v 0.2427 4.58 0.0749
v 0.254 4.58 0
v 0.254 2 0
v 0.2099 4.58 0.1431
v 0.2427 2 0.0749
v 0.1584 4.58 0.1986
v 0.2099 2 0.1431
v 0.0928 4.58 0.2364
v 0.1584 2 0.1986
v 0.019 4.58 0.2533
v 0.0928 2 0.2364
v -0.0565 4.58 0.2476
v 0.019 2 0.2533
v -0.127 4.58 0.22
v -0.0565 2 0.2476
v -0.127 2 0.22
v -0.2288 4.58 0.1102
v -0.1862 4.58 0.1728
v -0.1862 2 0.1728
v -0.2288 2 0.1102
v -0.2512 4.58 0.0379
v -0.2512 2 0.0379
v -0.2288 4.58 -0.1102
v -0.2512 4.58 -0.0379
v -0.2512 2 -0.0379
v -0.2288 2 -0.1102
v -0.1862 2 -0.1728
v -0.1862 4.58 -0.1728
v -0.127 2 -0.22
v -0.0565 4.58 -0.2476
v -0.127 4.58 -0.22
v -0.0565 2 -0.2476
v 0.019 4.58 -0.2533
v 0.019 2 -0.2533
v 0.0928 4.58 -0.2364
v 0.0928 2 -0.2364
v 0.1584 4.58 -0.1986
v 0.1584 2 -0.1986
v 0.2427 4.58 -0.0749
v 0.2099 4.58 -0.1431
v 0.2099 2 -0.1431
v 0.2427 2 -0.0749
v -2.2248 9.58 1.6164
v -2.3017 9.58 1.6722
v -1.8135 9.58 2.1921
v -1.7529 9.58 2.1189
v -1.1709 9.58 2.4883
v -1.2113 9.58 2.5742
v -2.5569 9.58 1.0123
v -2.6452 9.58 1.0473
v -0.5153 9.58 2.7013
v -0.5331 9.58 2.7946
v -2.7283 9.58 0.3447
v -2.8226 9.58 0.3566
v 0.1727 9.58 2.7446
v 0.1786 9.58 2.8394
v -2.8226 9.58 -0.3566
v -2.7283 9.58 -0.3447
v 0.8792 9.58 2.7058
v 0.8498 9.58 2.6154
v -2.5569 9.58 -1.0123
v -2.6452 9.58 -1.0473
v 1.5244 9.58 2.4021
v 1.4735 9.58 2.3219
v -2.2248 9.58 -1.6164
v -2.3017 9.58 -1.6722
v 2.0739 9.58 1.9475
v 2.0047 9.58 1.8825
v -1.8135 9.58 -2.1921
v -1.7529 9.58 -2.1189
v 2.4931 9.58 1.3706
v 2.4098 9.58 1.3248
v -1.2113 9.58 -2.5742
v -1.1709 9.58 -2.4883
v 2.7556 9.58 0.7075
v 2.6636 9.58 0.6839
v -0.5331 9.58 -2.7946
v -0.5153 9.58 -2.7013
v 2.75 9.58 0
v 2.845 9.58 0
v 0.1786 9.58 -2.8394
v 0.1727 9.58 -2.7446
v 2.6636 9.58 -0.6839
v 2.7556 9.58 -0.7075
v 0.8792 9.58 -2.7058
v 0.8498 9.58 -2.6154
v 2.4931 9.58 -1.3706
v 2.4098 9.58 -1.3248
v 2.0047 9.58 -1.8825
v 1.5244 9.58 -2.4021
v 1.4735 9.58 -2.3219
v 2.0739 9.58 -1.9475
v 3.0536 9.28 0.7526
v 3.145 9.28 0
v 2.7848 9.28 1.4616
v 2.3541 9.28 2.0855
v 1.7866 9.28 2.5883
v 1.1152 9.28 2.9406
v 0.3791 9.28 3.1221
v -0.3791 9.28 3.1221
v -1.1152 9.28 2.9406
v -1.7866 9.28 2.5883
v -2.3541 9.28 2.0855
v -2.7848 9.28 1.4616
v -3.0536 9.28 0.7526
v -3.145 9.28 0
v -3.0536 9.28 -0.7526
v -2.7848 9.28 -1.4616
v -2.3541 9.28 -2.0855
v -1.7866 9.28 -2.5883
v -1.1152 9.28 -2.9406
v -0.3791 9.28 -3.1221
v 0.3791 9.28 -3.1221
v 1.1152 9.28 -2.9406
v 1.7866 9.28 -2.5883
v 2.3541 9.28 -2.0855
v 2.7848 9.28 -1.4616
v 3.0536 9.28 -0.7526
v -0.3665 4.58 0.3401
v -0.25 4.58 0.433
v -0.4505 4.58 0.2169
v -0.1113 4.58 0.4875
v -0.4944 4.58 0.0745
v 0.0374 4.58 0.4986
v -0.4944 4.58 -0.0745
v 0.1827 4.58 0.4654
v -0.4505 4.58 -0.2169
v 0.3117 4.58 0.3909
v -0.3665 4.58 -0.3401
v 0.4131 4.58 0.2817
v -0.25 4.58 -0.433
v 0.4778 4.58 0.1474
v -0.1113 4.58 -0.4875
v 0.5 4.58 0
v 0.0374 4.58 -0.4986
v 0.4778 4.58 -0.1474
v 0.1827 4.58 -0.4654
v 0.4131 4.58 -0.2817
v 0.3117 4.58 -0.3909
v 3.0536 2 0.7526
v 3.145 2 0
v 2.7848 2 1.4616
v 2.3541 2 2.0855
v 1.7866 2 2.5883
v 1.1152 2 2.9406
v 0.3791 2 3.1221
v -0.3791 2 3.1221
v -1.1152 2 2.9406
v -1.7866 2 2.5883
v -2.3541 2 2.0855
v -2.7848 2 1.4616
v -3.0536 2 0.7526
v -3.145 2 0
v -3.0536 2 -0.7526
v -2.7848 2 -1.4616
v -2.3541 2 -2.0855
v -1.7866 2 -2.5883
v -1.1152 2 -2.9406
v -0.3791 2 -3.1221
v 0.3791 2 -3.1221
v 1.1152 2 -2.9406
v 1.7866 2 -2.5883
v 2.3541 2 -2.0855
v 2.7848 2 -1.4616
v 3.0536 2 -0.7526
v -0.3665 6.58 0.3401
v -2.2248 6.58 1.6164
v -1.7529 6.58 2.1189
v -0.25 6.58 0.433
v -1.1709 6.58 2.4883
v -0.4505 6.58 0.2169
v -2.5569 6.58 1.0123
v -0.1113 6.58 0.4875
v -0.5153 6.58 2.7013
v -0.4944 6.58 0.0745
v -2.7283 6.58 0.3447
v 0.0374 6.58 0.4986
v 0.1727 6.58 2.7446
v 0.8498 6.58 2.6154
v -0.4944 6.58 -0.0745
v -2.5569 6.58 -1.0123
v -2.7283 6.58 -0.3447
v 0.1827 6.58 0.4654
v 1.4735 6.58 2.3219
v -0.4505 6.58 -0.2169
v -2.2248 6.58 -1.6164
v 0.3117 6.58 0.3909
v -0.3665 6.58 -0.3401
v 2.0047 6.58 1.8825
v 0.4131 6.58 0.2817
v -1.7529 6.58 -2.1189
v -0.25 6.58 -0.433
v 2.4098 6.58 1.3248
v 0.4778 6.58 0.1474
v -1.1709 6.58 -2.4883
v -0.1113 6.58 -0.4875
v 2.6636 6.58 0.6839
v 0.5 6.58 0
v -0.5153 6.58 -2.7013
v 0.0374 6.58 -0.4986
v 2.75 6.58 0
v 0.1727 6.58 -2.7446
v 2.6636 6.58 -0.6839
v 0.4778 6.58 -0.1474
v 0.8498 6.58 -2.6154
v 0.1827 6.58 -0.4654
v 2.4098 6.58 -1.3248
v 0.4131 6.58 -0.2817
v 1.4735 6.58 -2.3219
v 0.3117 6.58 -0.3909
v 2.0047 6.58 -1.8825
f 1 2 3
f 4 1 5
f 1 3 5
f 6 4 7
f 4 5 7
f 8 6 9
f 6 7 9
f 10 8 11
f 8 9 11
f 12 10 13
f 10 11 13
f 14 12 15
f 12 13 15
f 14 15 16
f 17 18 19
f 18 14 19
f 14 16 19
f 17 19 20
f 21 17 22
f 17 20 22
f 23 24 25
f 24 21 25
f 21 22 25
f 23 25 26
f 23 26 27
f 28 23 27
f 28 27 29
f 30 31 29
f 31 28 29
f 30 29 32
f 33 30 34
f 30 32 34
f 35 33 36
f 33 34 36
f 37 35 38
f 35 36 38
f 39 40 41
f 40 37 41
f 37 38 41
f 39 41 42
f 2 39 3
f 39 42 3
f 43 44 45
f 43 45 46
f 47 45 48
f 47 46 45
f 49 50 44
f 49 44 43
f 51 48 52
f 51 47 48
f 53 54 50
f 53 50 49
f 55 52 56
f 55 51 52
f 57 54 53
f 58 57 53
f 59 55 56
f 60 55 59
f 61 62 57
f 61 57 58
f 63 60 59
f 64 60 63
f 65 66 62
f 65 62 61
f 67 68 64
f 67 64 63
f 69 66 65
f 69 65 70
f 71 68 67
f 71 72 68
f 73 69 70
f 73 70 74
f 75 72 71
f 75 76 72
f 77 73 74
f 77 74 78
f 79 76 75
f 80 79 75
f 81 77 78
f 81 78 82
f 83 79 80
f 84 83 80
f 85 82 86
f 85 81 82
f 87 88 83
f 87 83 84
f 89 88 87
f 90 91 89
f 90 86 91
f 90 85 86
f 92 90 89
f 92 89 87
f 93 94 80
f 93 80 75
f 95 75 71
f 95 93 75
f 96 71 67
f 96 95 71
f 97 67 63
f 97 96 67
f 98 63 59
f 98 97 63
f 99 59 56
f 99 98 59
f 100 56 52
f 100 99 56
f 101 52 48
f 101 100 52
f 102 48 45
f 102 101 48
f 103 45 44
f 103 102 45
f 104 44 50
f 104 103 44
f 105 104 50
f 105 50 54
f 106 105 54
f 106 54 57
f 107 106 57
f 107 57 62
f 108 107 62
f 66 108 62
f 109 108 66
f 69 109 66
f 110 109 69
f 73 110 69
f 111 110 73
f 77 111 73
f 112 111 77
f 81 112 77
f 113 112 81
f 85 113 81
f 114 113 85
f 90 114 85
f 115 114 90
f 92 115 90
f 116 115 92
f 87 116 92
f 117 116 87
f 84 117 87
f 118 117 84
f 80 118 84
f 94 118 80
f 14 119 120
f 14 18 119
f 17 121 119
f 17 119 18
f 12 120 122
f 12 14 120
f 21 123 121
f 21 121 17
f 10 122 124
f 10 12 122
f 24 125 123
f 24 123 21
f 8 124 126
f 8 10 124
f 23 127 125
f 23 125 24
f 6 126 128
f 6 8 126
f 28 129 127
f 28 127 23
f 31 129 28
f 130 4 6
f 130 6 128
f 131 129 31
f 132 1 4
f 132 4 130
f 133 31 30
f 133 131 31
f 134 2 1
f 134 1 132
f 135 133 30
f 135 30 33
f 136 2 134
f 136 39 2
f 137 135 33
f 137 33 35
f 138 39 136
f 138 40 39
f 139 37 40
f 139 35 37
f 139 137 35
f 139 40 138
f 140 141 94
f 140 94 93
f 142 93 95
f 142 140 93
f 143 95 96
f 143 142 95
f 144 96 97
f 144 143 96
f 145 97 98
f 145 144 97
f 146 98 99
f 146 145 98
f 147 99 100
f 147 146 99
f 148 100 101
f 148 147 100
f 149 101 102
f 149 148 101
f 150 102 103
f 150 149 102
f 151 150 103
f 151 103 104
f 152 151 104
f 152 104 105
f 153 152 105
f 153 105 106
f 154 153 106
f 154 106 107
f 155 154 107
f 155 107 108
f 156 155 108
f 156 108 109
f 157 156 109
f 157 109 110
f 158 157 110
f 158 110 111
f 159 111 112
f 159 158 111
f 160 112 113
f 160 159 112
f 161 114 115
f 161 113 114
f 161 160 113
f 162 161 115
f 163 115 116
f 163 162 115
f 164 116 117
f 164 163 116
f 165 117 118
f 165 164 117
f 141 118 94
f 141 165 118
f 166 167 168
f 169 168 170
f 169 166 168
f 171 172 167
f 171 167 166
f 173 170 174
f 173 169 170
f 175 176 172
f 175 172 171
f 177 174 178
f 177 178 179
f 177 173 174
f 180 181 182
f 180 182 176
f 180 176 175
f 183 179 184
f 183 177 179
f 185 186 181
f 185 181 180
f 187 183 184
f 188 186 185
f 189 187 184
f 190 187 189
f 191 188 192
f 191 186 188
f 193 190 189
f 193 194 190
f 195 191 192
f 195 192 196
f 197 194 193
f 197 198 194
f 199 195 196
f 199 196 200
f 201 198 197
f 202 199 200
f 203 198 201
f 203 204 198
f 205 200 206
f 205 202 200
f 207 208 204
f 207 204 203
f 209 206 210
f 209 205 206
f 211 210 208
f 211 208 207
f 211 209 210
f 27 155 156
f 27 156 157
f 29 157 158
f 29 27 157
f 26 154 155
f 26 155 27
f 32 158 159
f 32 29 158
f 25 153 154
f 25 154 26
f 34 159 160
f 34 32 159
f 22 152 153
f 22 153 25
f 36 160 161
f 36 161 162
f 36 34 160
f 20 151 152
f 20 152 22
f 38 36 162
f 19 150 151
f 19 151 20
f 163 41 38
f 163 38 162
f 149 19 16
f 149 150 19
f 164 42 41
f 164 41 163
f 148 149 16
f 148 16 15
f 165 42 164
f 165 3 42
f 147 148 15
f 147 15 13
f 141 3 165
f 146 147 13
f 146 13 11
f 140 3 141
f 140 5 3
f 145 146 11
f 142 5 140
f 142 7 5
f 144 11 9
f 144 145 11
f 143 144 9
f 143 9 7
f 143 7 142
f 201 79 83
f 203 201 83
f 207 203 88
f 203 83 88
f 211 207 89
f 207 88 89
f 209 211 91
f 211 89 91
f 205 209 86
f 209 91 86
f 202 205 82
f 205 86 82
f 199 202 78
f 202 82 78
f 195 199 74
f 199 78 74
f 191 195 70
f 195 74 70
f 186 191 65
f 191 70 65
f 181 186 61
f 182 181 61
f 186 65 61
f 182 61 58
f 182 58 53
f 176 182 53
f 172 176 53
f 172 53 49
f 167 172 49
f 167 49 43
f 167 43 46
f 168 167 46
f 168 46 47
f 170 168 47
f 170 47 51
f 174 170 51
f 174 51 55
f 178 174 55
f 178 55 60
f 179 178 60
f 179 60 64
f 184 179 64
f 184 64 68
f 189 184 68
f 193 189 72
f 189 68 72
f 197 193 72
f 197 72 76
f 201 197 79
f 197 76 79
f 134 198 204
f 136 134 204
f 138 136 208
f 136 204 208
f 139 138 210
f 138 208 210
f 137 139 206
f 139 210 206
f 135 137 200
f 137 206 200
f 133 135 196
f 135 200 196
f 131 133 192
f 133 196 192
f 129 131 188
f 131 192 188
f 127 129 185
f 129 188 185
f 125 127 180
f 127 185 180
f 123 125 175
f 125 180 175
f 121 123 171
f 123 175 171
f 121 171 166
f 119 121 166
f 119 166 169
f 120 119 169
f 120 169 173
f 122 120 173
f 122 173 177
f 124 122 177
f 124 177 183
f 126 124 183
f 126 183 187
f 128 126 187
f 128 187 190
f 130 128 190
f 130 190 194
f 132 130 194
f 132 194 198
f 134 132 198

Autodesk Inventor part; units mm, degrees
ref_plane "YZ Plane" through (0, 0, 0) normal (1, 0, 0) x (0, 1, 0)
ref_plane "XZ Plane" through (0, 0, 0) normal (0, 1, 0) x (-1, 0, 0)
ref_plane "XY Plane" through (0, 0, 0) normal (0, 0, 1) x (1, 0, 0)
sketch "Sketch1" plane through (0, 0, 0) normal (0, 1, 0) x (-1, 0, 0)
  line L0 (4.85, 6.35) -> (-4.85, 6.35)
  line L1 (-6.35, 4.85) -> (-6.35, -4.85)
  line L2 (-4.85, -6.35) -> (4.85, -6.35)
  line L3 (6.35, -4.85) -> (6.35, 4.85)
  line L4 (6.35, 6.35) -> (-6.35, -6.35) construction
  line L5 (-6.35, 6.35) -> (6.35, -6.35) construction
  line L6 (6.35, -4.85) -> (4.85, -6.35)
  line L7 (-4.85, -6.35) -> (-6.35, -4.85)
  line L8 (-4.85, 6.35) -> (-6.35, 4.85)
  line L9 (6.35, 4.85) -> (4.85, 6.35)
  line L10 (4.32, 4.32) -> (-4.32, 4.32) construction
  line L11 (-4.32, 4.32) -> (-4.32, -4.32) construction
  line L12 (-4.32, -4.32) -> (4.32, -4.32) construction
  line L13 (4.32, -4.32) -> (4.32, 4.32) construction
  line L14 (4.32, 4.32) -> (-4.32, -4.32) construction
  line L15 (-4.32, 4.32) -> (4.32, -4.32) construction
  circle A0 centre (0, 0) radius 1.3272
  dimension "d0" = 12.7
  dimension "d1" = 12.7
  dimension "d5" = 9.7
  dimension "d6" = 1.5
  dimension "d7" = 8.64
  dimension "d8" = 8.64
  dimension "d9" = 2.6543
extrude "Extrusion1" add sketch "Sketch1" along normal blind 1.65
sketch "Sketch2" plane through (0, 1.65, 0) normal (0, 1, 0) x (1, 0, 0)
  circle A0 centre (0, 0) radius 1.3272 projected
  line L0 (-4.32, -4.32) -> (4.32, -4.32) construction
  line L1 (4.32, -4.32) -> (4.32, 4.32) construction
  line L2 (4.32, 4.32) -> (-4.32, 4.32) construction
  line L3 (-4.32, 4.32) -> (-4.32, -4.32) construction
  line L4 (-4.32, -4.32) -> (4.32, 4.32) construction
  line L5 (4.32, -4.32) -> (-4.32, 4.32) construction
  dimension "d12" = 8.64
  dimension "d13" = 8.64
hole "Hole1" at (-4.32, 1.65, -4.32) at (4.32, 1.65, -4.32) at (4.32, 1.65, 4.32) at (-4.32, 1.65, 4.32) direction (0, -1, 0) diameter 2.64 depth 1.65 tip angle 118
sketch "Sketch3" plane through (0, 1.65, 0) normal (0, 1, 0) x (1, 0, 0)
  circle A0 centre (0, 0) radius 1.3272 projected
  circle A1 centre (0, 0) radius 3.145
  dimension "d21" = 6.29
extrude "Extrusion2" add sketch "Sketch3" along normal blind 7.93 contours A0 | A1
thread "Thread1" size "1/4-36 UNS" class "2A" standard "ANSI Unified Screw Threads" length 4.38
chamfer "Chamfer1" distance 0.3 angle 45 1 edges at (-3.145, 9.58, 0)
sketch "Sketch4" plane through (0, 9.58, 0) normal (0, 1, 0) x (1, 0, 0)
  circle A0 centre (0, 0) radius 2.845 projected
  circle A1 centre (0, 0) radius 2.75
  dimension "d30" = 5.5
extrude "Extrusion3" cut sketch "Sketch4" against normal blind 3 contours A1
sketch "Sketch5" plane through (0, 1.65, 0) normal (0, -1, 0) x (1, 0, 0)
  circle A0 centre (0, 0) radius 1.3272 projected
  circle A1 centre (0, 0) radius 0.254
  dimension "d33" = 0.508
extrude "Extrusion4" cut sketch "Sketch5" against normal blind 6 contours A1
sketch "Sketch6" plane through (0, 6.58, 0) normal (0, 1, 0) x (1, 0, 0)
  circle A0 centre (0, 0) radius 0.254 projected
  circle A1 centre (0, 0) radius 2.75 projected
  circle A2 centre (0, 0) radius 0.5
  dimension "d36" = 1
extrude "Extrusion5" cut sketch "Sketch6" against normal blind 2 contours A2
sketch "Sketch7" plane through (0, 0, 0) normal (0, -1, 0) x (1, 0, 0)
  line L0 (-6.35, -6.35) -> (6.35, -6.35)
  line L1 (6.35, -6.35) -> (6.35, 6.35)
  line L2 (6.35, 6.35) -> (-6.35, 6.35)
  line L3 (-6.35, 6.35) -> (-6.35, -6.35)
  circle A0 centre (0, 0) radius 0.254 projected
  line L4 (-6.35, -6.35) -> (6.35, 6.35) construction
  line L5 (6.35, -6.35) -> (-6.35, 6.35) construction
extrude "Extrusion6" cut sketch "Sketch7" against normal blind 2
properties part number "sma"
